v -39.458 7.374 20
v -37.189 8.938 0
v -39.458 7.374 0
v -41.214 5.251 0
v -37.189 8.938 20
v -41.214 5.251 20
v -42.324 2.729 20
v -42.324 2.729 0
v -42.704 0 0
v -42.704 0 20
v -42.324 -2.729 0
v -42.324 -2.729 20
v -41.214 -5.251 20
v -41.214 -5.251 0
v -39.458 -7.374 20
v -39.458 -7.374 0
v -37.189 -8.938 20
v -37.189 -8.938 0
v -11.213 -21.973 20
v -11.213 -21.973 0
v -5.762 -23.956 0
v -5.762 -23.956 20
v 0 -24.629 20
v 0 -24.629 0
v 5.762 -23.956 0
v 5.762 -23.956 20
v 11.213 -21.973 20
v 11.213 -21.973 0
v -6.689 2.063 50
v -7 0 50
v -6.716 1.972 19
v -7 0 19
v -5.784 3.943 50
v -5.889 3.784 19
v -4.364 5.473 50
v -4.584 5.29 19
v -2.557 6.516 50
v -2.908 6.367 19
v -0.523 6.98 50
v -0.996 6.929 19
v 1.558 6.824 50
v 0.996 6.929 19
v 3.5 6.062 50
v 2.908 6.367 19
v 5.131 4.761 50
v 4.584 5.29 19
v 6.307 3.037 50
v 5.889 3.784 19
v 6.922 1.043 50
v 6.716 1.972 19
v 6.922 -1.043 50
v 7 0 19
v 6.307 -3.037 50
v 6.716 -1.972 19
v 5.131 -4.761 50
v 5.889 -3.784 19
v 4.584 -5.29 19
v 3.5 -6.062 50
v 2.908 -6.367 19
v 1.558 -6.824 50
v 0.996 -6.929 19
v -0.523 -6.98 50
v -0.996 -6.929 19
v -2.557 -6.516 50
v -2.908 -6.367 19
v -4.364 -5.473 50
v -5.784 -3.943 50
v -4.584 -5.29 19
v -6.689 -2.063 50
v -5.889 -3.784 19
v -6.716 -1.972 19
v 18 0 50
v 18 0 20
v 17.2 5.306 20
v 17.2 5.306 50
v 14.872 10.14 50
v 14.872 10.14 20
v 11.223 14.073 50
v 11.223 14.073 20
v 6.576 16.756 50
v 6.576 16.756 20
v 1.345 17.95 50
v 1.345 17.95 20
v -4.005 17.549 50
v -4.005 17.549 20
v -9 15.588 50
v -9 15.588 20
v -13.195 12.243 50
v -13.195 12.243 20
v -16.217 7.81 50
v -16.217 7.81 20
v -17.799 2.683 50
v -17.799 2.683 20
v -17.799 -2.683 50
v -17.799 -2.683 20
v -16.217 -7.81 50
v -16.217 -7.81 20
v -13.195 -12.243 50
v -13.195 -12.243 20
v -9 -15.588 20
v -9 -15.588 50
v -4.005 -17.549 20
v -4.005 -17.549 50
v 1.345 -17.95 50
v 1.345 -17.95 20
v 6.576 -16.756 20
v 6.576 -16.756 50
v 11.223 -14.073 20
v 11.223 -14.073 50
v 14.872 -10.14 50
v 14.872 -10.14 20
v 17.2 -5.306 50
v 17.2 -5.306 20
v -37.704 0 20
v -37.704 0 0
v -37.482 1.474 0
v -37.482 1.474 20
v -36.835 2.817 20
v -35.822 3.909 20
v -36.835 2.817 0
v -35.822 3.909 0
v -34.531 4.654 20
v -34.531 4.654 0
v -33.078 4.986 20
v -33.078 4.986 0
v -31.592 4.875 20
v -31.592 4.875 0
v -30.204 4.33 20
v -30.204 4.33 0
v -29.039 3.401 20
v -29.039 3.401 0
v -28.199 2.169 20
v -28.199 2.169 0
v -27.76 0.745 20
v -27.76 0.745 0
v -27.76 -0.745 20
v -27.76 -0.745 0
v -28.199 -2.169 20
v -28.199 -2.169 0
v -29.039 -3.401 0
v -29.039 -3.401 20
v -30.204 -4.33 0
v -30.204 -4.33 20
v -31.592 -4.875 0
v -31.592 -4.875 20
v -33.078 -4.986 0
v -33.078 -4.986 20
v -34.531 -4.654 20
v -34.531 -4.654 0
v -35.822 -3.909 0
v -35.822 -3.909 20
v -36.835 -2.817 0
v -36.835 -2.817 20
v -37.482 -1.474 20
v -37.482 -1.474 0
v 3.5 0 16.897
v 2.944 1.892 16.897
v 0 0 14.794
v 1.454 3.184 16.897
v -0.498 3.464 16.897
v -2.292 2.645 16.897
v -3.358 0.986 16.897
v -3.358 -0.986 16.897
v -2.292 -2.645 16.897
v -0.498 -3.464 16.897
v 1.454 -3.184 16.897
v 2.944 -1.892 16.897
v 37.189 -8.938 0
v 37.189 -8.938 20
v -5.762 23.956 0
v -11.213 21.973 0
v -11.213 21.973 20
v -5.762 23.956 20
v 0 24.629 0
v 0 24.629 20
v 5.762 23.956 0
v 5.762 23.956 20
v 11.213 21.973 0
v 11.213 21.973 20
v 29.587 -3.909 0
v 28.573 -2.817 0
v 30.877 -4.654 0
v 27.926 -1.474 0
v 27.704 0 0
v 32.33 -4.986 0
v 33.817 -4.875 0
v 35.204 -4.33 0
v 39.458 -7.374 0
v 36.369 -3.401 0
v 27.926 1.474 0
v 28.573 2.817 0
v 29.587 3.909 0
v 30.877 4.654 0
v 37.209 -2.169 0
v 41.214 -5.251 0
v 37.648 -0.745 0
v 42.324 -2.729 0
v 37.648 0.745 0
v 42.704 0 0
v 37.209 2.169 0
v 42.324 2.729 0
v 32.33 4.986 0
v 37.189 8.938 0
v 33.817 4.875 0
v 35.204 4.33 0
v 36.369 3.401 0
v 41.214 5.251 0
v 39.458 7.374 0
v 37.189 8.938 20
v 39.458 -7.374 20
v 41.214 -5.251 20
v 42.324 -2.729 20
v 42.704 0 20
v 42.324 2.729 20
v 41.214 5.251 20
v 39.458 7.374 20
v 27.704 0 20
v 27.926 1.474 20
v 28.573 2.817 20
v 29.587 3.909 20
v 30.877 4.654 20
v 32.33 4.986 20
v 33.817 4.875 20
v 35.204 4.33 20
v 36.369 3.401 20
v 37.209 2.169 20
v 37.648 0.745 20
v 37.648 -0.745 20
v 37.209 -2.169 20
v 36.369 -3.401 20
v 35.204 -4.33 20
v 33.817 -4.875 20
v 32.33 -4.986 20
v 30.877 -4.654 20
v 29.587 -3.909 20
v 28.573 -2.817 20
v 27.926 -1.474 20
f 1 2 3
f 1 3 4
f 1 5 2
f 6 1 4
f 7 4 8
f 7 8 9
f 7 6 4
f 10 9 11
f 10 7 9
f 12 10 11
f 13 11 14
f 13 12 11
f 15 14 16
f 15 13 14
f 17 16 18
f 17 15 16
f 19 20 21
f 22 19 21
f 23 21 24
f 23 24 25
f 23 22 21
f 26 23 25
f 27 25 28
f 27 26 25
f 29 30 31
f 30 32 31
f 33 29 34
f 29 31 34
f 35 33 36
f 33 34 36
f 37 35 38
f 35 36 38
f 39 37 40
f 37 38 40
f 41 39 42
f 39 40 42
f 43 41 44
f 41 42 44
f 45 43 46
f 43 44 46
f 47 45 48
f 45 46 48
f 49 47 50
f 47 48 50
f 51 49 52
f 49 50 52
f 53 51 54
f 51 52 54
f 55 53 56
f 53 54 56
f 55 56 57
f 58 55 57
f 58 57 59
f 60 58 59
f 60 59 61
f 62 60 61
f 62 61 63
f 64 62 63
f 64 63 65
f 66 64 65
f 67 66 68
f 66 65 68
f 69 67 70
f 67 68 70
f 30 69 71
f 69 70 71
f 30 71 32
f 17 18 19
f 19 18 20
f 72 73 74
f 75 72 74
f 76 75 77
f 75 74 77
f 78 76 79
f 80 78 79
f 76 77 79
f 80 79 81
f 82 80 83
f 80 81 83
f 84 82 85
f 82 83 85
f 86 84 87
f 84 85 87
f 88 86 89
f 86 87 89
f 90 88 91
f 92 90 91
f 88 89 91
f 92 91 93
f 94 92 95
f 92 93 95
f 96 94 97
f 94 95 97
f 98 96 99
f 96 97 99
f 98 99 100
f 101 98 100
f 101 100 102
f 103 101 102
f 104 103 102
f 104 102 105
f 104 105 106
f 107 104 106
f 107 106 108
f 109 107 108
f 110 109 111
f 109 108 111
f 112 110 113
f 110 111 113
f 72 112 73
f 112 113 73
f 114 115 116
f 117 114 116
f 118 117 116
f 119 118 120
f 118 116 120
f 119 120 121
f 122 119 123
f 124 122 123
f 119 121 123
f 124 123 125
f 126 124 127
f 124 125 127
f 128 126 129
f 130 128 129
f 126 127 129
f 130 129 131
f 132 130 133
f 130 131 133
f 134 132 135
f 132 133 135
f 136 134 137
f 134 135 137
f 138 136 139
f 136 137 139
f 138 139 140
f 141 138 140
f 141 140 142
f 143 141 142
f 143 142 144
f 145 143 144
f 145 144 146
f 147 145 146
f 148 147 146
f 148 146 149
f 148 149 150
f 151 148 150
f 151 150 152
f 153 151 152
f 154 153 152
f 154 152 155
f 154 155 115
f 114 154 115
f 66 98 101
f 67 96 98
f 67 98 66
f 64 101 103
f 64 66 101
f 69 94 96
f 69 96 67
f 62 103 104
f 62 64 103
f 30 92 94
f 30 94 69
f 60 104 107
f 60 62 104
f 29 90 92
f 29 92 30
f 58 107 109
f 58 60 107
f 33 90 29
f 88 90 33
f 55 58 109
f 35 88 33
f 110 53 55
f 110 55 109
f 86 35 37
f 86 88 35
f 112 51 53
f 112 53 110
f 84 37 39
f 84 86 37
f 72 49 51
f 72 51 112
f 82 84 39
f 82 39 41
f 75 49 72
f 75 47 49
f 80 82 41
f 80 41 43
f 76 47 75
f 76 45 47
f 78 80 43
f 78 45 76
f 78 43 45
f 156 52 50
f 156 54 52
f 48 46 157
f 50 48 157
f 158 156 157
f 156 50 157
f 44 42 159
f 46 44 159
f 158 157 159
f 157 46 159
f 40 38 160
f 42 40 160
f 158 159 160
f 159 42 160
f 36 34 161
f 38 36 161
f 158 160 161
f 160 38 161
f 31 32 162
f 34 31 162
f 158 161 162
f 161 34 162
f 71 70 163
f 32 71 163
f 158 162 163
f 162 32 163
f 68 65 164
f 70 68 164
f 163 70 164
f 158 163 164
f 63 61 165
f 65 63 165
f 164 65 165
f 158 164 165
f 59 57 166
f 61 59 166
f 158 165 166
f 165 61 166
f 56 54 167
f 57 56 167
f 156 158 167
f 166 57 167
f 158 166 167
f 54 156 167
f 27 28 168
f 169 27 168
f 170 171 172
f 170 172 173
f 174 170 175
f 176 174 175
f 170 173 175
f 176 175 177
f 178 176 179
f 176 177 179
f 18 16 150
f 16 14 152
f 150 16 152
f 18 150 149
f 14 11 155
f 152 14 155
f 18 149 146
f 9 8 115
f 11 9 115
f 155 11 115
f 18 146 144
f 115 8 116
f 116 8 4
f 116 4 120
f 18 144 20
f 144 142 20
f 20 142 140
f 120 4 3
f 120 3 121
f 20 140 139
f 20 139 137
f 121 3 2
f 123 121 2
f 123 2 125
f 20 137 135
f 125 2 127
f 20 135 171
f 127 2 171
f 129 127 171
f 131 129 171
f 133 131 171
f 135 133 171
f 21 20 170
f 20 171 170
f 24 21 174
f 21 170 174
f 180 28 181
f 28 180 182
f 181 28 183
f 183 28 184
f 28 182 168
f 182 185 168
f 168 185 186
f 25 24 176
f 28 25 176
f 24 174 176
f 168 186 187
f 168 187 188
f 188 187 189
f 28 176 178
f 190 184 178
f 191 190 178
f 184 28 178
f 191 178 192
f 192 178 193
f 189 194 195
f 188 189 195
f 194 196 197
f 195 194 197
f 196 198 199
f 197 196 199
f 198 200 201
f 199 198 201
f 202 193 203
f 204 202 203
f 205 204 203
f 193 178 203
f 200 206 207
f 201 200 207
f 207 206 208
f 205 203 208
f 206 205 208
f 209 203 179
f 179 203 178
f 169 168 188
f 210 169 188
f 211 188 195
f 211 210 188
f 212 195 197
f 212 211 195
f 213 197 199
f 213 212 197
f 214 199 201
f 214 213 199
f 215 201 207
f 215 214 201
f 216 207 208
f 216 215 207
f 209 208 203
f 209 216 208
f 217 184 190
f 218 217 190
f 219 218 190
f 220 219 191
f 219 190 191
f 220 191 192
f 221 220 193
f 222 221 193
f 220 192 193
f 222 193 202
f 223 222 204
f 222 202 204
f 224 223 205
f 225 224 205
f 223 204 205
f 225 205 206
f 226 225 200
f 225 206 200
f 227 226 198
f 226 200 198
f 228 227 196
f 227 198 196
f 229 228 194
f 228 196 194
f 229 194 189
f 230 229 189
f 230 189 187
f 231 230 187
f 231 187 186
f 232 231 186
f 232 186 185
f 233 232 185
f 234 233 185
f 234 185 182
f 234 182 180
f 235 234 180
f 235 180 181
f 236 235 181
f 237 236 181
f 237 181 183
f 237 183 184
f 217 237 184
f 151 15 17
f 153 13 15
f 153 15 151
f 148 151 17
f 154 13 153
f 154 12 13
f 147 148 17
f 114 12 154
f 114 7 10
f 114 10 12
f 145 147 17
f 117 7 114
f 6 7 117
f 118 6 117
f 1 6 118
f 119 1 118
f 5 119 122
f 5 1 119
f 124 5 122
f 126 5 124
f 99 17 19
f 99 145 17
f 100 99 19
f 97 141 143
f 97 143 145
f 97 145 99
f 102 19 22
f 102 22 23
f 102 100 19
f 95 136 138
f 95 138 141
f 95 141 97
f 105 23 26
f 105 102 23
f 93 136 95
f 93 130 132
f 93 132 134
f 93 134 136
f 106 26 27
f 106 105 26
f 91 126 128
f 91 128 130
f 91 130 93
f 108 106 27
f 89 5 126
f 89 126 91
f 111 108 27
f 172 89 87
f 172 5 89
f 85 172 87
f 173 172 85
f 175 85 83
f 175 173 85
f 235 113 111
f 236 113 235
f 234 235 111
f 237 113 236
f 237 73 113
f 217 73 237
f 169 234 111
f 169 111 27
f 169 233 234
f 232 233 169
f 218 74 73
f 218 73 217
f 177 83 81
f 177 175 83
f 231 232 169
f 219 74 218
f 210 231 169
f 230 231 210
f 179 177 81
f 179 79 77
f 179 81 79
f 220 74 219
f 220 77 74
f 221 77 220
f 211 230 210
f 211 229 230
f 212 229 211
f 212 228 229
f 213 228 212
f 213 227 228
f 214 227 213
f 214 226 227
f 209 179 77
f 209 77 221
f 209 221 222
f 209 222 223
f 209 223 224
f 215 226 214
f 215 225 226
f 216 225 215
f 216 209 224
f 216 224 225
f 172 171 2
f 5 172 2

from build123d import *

# Parameters (mm, degrees)
F1_DEPTH = 20
F2_R     = 10
F3_R     = 25
F4_R     = 18
F5_DEPTH = 30
F7_D     = 10
F9_D     = 14
F9_DEPTH = 31
F9_TIP   = 4.2060243332


with BuildPart() as f1:
    # F0 (on Top) → F1 (new body)
    with BuildSketch(Plane.XY):
        Polygon((0, 27.6), (-55, 0), (0, -27.6), (55, 0), align=None)
    extrude(amount=F1_DEPTH)

    # F2
    f2_edges = [f1.edges().sort_by_distance(p)[0] for p in [
        (55, 0, 10),
        (-55, 0, 10),
    ]]
    fillet(f2_edges, radius=F2_R)

    # F3
    f3_edges = [f1.edges().sort_by_distance(p)[0] for p in [
        (0, -27.6, 10),
        (0, 27.6, 10),
    ]]
    fillet(f3_edges, radius=F3_R)

    # F4 (on face) → F5 (join)
    with BuildSketch(Plane.XY.offset(20)):
        Circle(F4_R)
    extrude(amount=F5_DEPTH)

    # F7 (through all)
    with Locations(Plane.XY.offset(20)):
        with Locations((-32.7041102381, 0), (32.7041102381, 0)):
            Hole(F7_D / 2)

    # F9
    with Locations(Plane.XY.offset(50)):
        with Locations((0, 0)):
            Hole(F9_D / 2, depth=F9_DEPTH)
            with Locations((0, 0, -(F9_DEPTH + F9_TIP / 2))):  # 118° drill point
                Cone(0, F9_D / 2, F9_TIP, mode=Mode.SUBTRACT)


solid = f1.part
